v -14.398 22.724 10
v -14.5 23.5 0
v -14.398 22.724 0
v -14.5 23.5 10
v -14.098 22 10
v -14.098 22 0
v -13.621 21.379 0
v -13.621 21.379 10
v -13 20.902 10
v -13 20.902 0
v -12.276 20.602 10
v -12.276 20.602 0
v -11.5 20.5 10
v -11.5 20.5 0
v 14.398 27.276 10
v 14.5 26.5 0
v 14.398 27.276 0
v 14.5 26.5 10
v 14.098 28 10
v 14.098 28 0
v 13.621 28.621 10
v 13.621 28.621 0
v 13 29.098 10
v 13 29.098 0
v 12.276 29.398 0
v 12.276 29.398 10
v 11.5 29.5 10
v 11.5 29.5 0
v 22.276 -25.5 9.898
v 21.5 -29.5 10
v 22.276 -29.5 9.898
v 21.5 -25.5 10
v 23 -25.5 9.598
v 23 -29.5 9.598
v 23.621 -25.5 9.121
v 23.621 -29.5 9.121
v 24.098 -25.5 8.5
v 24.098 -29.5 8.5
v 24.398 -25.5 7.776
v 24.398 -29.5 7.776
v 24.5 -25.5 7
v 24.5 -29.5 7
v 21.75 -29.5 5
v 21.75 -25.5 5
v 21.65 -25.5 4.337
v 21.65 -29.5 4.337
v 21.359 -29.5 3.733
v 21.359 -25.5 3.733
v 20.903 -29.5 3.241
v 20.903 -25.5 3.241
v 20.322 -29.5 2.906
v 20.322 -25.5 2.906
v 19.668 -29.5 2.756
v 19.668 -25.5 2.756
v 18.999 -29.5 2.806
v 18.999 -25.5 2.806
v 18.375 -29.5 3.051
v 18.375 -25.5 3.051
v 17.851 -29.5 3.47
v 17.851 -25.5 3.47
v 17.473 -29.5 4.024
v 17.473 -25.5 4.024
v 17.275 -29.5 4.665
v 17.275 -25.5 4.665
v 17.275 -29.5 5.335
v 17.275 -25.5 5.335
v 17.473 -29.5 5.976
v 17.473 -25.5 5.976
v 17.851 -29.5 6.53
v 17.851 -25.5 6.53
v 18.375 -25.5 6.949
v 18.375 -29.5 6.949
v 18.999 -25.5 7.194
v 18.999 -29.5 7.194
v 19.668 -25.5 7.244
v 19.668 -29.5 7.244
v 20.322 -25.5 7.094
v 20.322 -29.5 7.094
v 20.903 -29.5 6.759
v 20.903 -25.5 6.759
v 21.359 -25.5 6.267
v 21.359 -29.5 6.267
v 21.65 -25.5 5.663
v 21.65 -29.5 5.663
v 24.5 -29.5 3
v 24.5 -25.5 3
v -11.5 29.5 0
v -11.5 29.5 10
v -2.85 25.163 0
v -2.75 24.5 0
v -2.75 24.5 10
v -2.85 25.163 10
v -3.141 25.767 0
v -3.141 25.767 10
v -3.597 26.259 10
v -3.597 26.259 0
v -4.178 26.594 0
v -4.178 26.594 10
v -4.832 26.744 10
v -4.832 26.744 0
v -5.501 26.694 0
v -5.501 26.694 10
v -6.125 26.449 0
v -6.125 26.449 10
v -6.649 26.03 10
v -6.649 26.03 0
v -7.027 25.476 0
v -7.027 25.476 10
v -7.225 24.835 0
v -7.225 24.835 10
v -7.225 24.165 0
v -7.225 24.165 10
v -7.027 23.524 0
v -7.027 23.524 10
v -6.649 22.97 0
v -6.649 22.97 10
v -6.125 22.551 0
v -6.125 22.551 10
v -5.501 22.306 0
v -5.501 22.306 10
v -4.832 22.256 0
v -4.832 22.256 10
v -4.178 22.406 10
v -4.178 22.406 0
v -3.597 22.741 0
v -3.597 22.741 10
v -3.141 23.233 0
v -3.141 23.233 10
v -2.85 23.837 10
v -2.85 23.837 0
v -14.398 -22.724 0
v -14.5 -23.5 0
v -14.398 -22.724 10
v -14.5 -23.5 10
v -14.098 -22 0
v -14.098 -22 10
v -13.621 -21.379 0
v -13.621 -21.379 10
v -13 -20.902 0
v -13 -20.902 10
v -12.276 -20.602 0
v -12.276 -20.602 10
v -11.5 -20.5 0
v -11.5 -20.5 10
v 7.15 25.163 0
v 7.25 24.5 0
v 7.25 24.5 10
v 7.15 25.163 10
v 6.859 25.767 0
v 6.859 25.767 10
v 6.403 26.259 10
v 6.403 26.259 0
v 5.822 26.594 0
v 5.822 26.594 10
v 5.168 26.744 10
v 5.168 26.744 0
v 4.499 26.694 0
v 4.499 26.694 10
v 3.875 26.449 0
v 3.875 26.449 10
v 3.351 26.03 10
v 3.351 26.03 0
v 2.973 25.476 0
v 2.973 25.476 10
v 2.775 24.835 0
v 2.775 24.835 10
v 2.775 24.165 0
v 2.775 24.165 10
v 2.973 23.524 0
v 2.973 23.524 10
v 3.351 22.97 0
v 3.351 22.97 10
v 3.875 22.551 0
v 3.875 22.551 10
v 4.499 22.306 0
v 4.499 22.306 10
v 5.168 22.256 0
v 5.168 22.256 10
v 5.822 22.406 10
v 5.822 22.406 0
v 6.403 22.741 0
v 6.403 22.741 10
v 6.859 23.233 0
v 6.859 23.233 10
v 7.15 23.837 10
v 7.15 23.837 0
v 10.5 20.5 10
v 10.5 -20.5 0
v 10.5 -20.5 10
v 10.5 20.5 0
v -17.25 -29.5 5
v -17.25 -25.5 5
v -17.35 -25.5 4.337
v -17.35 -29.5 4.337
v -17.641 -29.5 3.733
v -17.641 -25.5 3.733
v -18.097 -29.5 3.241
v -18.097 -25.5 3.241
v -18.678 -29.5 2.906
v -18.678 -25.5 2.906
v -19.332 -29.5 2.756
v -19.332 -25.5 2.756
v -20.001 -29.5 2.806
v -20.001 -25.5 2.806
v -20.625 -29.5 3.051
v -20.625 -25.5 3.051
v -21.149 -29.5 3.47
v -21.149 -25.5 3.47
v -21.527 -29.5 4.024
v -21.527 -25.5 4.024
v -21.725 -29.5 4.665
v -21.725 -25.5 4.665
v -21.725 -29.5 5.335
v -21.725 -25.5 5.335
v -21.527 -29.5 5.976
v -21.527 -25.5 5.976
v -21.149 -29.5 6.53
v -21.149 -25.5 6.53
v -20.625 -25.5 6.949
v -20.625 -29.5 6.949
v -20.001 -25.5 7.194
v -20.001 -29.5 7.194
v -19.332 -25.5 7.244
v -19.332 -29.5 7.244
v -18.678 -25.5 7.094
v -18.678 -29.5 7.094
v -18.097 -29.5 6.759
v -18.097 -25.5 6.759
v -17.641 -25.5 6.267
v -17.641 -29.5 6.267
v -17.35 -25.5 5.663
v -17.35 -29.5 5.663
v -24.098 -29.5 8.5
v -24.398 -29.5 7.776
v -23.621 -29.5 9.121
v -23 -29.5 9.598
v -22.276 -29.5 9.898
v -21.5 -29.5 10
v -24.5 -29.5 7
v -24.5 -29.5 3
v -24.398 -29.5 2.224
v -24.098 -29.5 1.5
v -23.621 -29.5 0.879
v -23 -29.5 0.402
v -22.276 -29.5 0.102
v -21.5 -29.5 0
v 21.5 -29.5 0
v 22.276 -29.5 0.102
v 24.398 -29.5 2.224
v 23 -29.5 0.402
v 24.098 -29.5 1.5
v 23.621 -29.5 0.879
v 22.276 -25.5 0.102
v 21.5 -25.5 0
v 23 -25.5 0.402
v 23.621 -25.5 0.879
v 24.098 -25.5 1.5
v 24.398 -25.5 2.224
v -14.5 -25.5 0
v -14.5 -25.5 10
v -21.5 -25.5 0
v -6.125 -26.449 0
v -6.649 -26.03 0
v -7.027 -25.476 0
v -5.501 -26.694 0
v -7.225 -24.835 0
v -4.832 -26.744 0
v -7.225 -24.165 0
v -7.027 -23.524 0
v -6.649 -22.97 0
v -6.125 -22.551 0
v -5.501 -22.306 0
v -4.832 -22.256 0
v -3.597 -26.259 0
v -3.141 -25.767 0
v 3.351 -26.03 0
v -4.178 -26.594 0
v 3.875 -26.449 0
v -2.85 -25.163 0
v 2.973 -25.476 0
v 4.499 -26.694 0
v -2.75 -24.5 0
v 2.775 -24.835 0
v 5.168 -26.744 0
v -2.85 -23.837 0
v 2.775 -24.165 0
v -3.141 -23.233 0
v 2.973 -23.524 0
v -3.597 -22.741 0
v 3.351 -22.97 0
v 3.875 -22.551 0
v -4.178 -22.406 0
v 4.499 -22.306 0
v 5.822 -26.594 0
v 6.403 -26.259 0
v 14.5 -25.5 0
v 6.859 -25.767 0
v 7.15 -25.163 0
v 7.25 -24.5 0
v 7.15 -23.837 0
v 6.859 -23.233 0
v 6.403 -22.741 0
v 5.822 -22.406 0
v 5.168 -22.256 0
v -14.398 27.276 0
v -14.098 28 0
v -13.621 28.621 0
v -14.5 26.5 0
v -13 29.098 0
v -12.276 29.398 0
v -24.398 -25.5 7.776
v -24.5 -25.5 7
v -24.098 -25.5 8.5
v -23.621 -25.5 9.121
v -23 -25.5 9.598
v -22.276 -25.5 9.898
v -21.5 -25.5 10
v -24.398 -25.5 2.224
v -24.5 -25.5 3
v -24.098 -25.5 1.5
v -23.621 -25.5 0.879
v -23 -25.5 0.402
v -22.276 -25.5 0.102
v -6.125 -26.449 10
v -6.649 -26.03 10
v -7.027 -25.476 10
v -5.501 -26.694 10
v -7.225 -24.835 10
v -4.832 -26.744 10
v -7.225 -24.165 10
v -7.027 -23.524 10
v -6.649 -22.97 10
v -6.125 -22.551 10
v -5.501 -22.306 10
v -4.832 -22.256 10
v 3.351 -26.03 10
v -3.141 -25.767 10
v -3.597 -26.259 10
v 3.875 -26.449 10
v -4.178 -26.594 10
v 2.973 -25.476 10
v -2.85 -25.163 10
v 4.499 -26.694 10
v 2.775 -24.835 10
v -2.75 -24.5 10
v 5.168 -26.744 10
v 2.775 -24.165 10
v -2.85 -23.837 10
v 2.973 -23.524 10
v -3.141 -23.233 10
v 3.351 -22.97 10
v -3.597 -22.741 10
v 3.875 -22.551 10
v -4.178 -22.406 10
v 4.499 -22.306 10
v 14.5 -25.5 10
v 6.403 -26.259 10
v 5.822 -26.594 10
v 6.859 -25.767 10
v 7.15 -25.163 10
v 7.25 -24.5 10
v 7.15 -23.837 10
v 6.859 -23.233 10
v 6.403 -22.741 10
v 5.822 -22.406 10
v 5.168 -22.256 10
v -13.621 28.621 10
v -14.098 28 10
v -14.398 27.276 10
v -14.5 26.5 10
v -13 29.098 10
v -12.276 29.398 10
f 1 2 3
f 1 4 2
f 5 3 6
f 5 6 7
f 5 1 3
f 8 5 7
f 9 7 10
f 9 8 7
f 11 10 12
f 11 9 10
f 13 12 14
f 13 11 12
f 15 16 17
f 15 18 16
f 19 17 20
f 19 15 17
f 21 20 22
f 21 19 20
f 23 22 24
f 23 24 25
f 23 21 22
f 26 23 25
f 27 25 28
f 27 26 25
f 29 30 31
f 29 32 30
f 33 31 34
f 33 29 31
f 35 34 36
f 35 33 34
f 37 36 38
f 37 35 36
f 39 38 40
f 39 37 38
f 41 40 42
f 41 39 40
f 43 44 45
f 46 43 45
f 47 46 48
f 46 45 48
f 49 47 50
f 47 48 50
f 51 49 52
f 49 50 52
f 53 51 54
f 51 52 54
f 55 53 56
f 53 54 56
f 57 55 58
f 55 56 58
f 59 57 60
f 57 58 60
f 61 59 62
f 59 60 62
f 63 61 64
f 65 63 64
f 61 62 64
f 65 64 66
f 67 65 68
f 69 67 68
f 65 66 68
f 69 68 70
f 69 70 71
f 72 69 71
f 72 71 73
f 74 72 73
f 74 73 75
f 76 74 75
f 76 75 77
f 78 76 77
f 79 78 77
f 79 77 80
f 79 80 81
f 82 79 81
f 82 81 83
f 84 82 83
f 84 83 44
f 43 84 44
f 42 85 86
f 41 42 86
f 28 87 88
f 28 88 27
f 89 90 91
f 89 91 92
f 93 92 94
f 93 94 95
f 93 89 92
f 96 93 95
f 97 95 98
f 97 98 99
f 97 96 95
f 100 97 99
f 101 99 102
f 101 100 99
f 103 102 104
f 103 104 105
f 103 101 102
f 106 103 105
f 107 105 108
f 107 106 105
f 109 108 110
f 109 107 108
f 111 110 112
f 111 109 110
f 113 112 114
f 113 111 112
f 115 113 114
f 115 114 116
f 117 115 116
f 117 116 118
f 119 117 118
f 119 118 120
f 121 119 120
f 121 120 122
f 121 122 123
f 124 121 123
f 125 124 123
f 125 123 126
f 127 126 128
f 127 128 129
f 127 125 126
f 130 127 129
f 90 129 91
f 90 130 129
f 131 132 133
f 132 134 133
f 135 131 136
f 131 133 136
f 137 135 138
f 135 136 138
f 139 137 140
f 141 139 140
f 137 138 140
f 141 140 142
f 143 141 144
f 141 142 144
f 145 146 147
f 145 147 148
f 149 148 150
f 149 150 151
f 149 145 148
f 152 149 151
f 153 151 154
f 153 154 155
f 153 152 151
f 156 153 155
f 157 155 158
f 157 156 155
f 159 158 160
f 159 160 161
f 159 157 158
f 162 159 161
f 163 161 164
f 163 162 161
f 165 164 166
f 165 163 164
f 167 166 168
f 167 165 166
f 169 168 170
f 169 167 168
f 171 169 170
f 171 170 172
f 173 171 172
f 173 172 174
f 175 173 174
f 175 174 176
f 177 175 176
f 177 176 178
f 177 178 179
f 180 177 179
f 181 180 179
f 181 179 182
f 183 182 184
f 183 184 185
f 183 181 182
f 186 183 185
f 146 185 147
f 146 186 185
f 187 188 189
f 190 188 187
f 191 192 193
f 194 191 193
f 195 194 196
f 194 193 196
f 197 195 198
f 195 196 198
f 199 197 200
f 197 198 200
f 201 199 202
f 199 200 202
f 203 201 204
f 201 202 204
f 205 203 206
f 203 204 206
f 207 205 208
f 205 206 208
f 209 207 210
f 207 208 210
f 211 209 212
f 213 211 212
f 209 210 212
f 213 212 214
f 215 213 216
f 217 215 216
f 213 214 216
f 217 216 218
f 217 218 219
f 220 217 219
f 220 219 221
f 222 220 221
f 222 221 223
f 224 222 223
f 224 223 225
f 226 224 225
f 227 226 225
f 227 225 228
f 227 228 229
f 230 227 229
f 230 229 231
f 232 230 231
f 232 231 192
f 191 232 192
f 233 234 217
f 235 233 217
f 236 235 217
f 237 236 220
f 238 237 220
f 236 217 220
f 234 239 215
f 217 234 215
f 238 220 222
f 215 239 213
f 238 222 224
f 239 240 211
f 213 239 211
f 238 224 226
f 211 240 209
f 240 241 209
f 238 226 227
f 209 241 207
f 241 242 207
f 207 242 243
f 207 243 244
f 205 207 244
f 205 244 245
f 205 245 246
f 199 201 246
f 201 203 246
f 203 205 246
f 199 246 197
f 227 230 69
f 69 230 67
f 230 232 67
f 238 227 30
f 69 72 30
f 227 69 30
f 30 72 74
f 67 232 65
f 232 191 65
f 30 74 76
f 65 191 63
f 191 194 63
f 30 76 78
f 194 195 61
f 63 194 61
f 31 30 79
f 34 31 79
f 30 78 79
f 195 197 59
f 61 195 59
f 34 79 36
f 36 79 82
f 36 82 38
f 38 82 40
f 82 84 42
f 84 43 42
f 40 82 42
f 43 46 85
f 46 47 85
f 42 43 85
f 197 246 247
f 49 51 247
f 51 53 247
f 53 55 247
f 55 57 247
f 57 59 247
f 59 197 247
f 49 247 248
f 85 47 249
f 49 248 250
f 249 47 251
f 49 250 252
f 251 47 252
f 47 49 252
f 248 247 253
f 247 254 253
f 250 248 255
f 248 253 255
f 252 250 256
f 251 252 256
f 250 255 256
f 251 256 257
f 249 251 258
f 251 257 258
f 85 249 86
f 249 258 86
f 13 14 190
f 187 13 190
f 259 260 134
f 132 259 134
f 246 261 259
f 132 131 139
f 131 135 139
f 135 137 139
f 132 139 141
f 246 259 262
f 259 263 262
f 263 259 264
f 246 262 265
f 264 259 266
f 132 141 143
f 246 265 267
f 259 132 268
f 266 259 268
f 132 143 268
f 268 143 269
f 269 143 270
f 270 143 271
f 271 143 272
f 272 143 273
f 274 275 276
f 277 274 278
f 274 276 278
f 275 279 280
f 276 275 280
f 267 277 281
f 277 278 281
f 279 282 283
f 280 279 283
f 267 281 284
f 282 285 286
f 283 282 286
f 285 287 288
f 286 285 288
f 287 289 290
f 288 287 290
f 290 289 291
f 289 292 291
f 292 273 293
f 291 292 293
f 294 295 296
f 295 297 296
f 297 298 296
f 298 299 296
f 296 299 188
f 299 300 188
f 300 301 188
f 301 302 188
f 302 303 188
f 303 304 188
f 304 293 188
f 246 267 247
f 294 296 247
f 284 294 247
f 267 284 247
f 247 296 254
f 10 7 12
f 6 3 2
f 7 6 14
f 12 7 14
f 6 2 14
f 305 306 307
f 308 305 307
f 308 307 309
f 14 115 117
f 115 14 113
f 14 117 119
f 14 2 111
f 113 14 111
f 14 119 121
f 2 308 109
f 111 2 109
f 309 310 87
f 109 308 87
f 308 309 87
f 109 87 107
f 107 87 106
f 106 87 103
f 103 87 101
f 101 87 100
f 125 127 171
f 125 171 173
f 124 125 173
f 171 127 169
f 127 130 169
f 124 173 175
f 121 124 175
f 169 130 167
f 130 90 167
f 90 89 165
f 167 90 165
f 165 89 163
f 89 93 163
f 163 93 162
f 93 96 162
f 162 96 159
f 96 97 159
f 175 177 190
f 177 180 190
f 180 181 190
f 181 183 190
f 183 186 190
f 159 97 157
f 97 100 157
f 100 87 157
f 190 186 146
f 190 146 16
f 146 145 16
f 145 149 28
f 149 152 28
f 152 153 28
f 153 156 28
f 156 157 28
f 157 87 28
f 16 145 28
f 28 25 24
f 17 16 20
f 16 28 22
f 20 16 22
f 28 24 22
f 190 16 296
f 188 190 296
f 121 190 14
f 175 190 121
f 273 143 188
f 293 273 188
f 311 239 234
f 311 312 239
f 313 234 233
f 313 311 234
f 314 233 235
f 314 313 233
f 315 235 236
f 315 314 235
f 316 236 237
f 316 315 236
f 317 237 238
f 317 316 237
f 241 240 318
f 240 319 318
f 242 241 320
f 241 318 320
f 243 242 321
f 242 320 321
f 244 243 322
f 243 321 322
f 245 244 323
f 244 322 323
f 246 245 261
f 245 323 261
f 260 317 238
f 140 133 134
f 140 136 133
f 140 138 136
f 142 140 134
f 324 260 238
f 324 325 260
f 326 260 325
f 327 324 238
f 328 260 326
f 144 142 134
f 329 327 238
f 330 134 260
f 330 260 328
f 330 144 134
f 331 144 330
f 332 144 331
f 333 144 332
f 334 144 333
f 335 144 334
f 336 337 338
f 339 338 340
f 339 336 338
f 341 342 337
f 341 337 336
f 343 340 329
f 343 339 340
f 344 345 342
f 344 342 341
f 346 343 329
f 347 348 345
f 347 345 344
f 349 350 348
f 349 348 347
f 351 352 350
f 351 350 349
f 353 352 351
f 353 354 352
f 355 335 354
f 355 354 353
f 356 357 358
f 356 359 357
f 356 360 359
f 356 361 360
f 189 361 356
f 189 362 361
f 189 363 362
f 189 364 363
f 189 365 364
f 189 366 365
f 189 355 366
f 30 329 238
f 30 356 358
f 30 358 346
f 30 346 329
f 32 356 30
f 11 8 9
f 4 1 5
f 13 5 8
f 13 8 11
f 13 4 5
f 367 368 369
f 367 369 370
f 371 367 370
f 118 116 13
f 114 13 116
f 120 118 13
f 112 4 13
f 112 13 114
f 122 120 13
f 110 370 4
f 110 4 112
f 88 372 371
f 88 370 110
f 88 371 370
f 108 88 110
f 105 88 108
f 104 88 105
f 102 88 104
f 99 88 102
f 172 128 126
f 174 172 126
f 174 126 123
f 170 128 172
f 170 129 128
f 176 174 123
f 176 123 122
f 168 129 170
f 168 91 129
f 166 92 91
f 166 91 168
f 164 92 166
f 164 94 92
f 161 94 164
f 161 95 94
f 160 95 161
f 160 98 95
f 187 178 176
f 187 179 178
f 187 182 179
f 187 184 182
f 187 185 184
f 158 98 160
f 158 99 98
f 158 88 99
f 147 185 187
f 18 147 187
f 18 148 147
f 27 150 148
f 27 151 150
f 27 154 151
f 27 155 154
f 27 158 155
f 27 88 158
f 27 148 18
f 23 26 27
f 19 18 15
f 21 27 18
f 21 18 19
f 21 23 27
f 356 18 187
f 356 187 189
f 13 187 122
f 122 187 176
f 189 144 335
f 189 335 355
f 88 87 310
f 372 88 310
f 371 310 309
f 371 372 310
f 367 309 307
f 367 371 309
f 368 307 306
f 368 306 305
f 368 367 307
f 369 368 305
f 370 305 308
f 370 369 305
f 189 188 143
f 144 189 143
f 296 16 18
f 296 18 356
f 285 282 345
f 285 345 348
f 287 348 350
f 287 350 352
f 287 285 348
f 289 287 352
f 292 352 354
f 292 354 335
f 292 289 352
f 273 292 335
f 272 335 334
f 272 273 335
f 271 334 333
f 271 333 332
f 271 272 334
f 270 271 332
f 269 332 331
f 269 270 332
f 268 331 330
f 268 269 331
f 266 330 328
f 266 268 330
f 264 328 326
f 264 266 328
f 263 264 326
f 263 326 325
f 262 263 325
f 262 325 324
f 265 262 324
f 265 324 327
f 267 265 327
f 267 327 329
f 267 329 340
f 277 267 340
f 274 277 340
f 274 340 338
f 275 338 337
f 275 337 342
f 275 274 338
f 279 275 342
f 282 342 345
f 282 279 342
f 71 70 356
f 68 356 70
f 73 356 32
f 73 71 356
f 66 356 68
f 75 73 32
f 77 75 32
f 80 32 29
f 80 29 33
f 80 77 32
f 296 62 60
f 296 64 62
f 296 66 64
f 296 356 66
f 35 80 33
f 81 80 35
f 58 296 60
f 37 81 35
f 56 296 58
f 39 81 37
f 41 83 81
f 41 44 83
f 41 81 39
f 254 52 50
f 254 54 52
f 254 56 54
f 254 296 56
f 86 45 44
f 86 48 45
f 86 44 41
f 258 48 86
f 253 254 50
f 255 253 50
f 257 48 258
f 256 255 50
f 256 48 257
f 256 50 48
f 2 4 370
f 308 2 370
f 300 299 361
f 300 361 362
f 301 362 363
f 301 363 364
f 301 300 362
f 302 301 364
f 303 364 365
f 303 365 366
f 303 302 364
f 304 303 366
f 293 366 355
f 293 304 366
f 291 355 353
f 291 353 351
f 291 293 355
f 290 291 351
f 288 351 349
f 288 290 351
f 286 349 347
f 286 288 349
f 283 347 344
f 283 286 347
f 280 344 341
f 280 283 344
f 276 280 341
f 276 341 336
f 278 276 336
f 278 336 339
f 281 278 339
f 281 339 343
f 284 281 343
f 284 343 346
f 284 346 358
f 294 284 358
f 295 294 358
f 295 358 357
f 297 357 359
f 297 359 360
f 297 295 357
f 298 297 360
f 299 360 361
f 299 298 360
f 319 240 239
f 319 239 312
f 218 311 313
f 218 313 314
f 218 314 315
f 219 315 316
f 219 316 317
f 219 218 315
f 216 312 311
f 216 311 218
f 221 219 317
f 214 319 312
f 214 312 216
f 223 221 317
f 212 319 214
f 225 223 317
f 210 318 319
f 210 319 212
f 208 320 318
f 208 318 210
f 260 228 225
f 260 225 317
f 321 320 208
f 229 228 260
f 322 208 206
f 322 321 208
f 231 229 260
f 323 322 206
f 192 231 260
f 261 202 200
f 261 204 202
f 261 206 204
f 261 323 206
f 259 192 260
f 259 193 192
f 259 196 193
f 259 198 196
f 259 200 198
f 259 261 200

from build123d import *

# Parameters (mm, degrees)
SKETCH_1_W          = 10
SKETCH_1_H          = 4
SKETCH_1_R          = 2.25
EXTRUDE_1_DEPTH     = 10
SKETCH_2_R          = 2.25
CUT_EXTRUDE_1_DEPTH = 10
FILLET_1_R          = 3


with BuildPart() as part:
    # 草图1 → 凸台-拉伸1 (new body)
    with BuildSketch(Plane.XY):
        with Locations((-19.5, -27.5)):
            Rectangle(SKETCH_1_W, SKETCH_1_H)
        Polygon((-14.5, -20.5), (-10.5, -20.5), (10.5, -20.5), (10.5, 20.5), (-10.5, 20.5), (-14.5, 20.5), (-14.5, 29.5), (14.5, 29.5), (14.5, -29.5), (-14.5, -29.5), align=None)
        with Locations((5, 24.5)):
            Circle(SKETCH_1_R, mode=Mode.SUBTRACT)
        with Locations((-5, 24.5)):
            Circle(SKETCH_1_R, mode=Mode.SUBTRACT)
        with Locations((5, -24.5)):
            Circle(SKETCH_1_R, mode=Mode.SUBTRACT)
        with Locations((-5, -24.5)):
            Circle(SKETCH_1_R, mode=Mode.SUBTRACT)
        with Locations((19.5, -27.5)):
            Rectangle(SKETCH_1_W, SKETCH_1_H)
    extrude(amount=EXTRUDE_1_DEPTH)

    # 草图2 → 切除-拉伸1 (cut)
    with BuildSketch(Plane(origin=(0, -25.5, 0), x_dir=(1, 0, 0), z_dir=(0, 1, 0))):
        with Locations((19.5, -5)):
            Circle(SKETCH_2_R)
        with Locations((-19.5, -5)):
            Circle(SKETCH_2_R)
    extrude(amount=-CUT_EXTRUDE_1_DEPTH, mode=Mode.SUBTRACT)

    # 圆角1
    fillet_1_edges = [part.edges().sort_by_distance(p)[0] for p in [
        (-24.5, -27.5, 10),
        (24.5, -27.5, 0),
        (24.5, -27.5, 10),
        (-24.5, -27.5, 0),
        (-14.5, -20.5, 5),
        (-14.5, 20.5, 5),
        (-14.5, 29.5, 5),
        (14.5, 29.5, 5),
    ]]
    fillet(fillet_1_edges, radius=FILLET_1_R)


solid = part.part
